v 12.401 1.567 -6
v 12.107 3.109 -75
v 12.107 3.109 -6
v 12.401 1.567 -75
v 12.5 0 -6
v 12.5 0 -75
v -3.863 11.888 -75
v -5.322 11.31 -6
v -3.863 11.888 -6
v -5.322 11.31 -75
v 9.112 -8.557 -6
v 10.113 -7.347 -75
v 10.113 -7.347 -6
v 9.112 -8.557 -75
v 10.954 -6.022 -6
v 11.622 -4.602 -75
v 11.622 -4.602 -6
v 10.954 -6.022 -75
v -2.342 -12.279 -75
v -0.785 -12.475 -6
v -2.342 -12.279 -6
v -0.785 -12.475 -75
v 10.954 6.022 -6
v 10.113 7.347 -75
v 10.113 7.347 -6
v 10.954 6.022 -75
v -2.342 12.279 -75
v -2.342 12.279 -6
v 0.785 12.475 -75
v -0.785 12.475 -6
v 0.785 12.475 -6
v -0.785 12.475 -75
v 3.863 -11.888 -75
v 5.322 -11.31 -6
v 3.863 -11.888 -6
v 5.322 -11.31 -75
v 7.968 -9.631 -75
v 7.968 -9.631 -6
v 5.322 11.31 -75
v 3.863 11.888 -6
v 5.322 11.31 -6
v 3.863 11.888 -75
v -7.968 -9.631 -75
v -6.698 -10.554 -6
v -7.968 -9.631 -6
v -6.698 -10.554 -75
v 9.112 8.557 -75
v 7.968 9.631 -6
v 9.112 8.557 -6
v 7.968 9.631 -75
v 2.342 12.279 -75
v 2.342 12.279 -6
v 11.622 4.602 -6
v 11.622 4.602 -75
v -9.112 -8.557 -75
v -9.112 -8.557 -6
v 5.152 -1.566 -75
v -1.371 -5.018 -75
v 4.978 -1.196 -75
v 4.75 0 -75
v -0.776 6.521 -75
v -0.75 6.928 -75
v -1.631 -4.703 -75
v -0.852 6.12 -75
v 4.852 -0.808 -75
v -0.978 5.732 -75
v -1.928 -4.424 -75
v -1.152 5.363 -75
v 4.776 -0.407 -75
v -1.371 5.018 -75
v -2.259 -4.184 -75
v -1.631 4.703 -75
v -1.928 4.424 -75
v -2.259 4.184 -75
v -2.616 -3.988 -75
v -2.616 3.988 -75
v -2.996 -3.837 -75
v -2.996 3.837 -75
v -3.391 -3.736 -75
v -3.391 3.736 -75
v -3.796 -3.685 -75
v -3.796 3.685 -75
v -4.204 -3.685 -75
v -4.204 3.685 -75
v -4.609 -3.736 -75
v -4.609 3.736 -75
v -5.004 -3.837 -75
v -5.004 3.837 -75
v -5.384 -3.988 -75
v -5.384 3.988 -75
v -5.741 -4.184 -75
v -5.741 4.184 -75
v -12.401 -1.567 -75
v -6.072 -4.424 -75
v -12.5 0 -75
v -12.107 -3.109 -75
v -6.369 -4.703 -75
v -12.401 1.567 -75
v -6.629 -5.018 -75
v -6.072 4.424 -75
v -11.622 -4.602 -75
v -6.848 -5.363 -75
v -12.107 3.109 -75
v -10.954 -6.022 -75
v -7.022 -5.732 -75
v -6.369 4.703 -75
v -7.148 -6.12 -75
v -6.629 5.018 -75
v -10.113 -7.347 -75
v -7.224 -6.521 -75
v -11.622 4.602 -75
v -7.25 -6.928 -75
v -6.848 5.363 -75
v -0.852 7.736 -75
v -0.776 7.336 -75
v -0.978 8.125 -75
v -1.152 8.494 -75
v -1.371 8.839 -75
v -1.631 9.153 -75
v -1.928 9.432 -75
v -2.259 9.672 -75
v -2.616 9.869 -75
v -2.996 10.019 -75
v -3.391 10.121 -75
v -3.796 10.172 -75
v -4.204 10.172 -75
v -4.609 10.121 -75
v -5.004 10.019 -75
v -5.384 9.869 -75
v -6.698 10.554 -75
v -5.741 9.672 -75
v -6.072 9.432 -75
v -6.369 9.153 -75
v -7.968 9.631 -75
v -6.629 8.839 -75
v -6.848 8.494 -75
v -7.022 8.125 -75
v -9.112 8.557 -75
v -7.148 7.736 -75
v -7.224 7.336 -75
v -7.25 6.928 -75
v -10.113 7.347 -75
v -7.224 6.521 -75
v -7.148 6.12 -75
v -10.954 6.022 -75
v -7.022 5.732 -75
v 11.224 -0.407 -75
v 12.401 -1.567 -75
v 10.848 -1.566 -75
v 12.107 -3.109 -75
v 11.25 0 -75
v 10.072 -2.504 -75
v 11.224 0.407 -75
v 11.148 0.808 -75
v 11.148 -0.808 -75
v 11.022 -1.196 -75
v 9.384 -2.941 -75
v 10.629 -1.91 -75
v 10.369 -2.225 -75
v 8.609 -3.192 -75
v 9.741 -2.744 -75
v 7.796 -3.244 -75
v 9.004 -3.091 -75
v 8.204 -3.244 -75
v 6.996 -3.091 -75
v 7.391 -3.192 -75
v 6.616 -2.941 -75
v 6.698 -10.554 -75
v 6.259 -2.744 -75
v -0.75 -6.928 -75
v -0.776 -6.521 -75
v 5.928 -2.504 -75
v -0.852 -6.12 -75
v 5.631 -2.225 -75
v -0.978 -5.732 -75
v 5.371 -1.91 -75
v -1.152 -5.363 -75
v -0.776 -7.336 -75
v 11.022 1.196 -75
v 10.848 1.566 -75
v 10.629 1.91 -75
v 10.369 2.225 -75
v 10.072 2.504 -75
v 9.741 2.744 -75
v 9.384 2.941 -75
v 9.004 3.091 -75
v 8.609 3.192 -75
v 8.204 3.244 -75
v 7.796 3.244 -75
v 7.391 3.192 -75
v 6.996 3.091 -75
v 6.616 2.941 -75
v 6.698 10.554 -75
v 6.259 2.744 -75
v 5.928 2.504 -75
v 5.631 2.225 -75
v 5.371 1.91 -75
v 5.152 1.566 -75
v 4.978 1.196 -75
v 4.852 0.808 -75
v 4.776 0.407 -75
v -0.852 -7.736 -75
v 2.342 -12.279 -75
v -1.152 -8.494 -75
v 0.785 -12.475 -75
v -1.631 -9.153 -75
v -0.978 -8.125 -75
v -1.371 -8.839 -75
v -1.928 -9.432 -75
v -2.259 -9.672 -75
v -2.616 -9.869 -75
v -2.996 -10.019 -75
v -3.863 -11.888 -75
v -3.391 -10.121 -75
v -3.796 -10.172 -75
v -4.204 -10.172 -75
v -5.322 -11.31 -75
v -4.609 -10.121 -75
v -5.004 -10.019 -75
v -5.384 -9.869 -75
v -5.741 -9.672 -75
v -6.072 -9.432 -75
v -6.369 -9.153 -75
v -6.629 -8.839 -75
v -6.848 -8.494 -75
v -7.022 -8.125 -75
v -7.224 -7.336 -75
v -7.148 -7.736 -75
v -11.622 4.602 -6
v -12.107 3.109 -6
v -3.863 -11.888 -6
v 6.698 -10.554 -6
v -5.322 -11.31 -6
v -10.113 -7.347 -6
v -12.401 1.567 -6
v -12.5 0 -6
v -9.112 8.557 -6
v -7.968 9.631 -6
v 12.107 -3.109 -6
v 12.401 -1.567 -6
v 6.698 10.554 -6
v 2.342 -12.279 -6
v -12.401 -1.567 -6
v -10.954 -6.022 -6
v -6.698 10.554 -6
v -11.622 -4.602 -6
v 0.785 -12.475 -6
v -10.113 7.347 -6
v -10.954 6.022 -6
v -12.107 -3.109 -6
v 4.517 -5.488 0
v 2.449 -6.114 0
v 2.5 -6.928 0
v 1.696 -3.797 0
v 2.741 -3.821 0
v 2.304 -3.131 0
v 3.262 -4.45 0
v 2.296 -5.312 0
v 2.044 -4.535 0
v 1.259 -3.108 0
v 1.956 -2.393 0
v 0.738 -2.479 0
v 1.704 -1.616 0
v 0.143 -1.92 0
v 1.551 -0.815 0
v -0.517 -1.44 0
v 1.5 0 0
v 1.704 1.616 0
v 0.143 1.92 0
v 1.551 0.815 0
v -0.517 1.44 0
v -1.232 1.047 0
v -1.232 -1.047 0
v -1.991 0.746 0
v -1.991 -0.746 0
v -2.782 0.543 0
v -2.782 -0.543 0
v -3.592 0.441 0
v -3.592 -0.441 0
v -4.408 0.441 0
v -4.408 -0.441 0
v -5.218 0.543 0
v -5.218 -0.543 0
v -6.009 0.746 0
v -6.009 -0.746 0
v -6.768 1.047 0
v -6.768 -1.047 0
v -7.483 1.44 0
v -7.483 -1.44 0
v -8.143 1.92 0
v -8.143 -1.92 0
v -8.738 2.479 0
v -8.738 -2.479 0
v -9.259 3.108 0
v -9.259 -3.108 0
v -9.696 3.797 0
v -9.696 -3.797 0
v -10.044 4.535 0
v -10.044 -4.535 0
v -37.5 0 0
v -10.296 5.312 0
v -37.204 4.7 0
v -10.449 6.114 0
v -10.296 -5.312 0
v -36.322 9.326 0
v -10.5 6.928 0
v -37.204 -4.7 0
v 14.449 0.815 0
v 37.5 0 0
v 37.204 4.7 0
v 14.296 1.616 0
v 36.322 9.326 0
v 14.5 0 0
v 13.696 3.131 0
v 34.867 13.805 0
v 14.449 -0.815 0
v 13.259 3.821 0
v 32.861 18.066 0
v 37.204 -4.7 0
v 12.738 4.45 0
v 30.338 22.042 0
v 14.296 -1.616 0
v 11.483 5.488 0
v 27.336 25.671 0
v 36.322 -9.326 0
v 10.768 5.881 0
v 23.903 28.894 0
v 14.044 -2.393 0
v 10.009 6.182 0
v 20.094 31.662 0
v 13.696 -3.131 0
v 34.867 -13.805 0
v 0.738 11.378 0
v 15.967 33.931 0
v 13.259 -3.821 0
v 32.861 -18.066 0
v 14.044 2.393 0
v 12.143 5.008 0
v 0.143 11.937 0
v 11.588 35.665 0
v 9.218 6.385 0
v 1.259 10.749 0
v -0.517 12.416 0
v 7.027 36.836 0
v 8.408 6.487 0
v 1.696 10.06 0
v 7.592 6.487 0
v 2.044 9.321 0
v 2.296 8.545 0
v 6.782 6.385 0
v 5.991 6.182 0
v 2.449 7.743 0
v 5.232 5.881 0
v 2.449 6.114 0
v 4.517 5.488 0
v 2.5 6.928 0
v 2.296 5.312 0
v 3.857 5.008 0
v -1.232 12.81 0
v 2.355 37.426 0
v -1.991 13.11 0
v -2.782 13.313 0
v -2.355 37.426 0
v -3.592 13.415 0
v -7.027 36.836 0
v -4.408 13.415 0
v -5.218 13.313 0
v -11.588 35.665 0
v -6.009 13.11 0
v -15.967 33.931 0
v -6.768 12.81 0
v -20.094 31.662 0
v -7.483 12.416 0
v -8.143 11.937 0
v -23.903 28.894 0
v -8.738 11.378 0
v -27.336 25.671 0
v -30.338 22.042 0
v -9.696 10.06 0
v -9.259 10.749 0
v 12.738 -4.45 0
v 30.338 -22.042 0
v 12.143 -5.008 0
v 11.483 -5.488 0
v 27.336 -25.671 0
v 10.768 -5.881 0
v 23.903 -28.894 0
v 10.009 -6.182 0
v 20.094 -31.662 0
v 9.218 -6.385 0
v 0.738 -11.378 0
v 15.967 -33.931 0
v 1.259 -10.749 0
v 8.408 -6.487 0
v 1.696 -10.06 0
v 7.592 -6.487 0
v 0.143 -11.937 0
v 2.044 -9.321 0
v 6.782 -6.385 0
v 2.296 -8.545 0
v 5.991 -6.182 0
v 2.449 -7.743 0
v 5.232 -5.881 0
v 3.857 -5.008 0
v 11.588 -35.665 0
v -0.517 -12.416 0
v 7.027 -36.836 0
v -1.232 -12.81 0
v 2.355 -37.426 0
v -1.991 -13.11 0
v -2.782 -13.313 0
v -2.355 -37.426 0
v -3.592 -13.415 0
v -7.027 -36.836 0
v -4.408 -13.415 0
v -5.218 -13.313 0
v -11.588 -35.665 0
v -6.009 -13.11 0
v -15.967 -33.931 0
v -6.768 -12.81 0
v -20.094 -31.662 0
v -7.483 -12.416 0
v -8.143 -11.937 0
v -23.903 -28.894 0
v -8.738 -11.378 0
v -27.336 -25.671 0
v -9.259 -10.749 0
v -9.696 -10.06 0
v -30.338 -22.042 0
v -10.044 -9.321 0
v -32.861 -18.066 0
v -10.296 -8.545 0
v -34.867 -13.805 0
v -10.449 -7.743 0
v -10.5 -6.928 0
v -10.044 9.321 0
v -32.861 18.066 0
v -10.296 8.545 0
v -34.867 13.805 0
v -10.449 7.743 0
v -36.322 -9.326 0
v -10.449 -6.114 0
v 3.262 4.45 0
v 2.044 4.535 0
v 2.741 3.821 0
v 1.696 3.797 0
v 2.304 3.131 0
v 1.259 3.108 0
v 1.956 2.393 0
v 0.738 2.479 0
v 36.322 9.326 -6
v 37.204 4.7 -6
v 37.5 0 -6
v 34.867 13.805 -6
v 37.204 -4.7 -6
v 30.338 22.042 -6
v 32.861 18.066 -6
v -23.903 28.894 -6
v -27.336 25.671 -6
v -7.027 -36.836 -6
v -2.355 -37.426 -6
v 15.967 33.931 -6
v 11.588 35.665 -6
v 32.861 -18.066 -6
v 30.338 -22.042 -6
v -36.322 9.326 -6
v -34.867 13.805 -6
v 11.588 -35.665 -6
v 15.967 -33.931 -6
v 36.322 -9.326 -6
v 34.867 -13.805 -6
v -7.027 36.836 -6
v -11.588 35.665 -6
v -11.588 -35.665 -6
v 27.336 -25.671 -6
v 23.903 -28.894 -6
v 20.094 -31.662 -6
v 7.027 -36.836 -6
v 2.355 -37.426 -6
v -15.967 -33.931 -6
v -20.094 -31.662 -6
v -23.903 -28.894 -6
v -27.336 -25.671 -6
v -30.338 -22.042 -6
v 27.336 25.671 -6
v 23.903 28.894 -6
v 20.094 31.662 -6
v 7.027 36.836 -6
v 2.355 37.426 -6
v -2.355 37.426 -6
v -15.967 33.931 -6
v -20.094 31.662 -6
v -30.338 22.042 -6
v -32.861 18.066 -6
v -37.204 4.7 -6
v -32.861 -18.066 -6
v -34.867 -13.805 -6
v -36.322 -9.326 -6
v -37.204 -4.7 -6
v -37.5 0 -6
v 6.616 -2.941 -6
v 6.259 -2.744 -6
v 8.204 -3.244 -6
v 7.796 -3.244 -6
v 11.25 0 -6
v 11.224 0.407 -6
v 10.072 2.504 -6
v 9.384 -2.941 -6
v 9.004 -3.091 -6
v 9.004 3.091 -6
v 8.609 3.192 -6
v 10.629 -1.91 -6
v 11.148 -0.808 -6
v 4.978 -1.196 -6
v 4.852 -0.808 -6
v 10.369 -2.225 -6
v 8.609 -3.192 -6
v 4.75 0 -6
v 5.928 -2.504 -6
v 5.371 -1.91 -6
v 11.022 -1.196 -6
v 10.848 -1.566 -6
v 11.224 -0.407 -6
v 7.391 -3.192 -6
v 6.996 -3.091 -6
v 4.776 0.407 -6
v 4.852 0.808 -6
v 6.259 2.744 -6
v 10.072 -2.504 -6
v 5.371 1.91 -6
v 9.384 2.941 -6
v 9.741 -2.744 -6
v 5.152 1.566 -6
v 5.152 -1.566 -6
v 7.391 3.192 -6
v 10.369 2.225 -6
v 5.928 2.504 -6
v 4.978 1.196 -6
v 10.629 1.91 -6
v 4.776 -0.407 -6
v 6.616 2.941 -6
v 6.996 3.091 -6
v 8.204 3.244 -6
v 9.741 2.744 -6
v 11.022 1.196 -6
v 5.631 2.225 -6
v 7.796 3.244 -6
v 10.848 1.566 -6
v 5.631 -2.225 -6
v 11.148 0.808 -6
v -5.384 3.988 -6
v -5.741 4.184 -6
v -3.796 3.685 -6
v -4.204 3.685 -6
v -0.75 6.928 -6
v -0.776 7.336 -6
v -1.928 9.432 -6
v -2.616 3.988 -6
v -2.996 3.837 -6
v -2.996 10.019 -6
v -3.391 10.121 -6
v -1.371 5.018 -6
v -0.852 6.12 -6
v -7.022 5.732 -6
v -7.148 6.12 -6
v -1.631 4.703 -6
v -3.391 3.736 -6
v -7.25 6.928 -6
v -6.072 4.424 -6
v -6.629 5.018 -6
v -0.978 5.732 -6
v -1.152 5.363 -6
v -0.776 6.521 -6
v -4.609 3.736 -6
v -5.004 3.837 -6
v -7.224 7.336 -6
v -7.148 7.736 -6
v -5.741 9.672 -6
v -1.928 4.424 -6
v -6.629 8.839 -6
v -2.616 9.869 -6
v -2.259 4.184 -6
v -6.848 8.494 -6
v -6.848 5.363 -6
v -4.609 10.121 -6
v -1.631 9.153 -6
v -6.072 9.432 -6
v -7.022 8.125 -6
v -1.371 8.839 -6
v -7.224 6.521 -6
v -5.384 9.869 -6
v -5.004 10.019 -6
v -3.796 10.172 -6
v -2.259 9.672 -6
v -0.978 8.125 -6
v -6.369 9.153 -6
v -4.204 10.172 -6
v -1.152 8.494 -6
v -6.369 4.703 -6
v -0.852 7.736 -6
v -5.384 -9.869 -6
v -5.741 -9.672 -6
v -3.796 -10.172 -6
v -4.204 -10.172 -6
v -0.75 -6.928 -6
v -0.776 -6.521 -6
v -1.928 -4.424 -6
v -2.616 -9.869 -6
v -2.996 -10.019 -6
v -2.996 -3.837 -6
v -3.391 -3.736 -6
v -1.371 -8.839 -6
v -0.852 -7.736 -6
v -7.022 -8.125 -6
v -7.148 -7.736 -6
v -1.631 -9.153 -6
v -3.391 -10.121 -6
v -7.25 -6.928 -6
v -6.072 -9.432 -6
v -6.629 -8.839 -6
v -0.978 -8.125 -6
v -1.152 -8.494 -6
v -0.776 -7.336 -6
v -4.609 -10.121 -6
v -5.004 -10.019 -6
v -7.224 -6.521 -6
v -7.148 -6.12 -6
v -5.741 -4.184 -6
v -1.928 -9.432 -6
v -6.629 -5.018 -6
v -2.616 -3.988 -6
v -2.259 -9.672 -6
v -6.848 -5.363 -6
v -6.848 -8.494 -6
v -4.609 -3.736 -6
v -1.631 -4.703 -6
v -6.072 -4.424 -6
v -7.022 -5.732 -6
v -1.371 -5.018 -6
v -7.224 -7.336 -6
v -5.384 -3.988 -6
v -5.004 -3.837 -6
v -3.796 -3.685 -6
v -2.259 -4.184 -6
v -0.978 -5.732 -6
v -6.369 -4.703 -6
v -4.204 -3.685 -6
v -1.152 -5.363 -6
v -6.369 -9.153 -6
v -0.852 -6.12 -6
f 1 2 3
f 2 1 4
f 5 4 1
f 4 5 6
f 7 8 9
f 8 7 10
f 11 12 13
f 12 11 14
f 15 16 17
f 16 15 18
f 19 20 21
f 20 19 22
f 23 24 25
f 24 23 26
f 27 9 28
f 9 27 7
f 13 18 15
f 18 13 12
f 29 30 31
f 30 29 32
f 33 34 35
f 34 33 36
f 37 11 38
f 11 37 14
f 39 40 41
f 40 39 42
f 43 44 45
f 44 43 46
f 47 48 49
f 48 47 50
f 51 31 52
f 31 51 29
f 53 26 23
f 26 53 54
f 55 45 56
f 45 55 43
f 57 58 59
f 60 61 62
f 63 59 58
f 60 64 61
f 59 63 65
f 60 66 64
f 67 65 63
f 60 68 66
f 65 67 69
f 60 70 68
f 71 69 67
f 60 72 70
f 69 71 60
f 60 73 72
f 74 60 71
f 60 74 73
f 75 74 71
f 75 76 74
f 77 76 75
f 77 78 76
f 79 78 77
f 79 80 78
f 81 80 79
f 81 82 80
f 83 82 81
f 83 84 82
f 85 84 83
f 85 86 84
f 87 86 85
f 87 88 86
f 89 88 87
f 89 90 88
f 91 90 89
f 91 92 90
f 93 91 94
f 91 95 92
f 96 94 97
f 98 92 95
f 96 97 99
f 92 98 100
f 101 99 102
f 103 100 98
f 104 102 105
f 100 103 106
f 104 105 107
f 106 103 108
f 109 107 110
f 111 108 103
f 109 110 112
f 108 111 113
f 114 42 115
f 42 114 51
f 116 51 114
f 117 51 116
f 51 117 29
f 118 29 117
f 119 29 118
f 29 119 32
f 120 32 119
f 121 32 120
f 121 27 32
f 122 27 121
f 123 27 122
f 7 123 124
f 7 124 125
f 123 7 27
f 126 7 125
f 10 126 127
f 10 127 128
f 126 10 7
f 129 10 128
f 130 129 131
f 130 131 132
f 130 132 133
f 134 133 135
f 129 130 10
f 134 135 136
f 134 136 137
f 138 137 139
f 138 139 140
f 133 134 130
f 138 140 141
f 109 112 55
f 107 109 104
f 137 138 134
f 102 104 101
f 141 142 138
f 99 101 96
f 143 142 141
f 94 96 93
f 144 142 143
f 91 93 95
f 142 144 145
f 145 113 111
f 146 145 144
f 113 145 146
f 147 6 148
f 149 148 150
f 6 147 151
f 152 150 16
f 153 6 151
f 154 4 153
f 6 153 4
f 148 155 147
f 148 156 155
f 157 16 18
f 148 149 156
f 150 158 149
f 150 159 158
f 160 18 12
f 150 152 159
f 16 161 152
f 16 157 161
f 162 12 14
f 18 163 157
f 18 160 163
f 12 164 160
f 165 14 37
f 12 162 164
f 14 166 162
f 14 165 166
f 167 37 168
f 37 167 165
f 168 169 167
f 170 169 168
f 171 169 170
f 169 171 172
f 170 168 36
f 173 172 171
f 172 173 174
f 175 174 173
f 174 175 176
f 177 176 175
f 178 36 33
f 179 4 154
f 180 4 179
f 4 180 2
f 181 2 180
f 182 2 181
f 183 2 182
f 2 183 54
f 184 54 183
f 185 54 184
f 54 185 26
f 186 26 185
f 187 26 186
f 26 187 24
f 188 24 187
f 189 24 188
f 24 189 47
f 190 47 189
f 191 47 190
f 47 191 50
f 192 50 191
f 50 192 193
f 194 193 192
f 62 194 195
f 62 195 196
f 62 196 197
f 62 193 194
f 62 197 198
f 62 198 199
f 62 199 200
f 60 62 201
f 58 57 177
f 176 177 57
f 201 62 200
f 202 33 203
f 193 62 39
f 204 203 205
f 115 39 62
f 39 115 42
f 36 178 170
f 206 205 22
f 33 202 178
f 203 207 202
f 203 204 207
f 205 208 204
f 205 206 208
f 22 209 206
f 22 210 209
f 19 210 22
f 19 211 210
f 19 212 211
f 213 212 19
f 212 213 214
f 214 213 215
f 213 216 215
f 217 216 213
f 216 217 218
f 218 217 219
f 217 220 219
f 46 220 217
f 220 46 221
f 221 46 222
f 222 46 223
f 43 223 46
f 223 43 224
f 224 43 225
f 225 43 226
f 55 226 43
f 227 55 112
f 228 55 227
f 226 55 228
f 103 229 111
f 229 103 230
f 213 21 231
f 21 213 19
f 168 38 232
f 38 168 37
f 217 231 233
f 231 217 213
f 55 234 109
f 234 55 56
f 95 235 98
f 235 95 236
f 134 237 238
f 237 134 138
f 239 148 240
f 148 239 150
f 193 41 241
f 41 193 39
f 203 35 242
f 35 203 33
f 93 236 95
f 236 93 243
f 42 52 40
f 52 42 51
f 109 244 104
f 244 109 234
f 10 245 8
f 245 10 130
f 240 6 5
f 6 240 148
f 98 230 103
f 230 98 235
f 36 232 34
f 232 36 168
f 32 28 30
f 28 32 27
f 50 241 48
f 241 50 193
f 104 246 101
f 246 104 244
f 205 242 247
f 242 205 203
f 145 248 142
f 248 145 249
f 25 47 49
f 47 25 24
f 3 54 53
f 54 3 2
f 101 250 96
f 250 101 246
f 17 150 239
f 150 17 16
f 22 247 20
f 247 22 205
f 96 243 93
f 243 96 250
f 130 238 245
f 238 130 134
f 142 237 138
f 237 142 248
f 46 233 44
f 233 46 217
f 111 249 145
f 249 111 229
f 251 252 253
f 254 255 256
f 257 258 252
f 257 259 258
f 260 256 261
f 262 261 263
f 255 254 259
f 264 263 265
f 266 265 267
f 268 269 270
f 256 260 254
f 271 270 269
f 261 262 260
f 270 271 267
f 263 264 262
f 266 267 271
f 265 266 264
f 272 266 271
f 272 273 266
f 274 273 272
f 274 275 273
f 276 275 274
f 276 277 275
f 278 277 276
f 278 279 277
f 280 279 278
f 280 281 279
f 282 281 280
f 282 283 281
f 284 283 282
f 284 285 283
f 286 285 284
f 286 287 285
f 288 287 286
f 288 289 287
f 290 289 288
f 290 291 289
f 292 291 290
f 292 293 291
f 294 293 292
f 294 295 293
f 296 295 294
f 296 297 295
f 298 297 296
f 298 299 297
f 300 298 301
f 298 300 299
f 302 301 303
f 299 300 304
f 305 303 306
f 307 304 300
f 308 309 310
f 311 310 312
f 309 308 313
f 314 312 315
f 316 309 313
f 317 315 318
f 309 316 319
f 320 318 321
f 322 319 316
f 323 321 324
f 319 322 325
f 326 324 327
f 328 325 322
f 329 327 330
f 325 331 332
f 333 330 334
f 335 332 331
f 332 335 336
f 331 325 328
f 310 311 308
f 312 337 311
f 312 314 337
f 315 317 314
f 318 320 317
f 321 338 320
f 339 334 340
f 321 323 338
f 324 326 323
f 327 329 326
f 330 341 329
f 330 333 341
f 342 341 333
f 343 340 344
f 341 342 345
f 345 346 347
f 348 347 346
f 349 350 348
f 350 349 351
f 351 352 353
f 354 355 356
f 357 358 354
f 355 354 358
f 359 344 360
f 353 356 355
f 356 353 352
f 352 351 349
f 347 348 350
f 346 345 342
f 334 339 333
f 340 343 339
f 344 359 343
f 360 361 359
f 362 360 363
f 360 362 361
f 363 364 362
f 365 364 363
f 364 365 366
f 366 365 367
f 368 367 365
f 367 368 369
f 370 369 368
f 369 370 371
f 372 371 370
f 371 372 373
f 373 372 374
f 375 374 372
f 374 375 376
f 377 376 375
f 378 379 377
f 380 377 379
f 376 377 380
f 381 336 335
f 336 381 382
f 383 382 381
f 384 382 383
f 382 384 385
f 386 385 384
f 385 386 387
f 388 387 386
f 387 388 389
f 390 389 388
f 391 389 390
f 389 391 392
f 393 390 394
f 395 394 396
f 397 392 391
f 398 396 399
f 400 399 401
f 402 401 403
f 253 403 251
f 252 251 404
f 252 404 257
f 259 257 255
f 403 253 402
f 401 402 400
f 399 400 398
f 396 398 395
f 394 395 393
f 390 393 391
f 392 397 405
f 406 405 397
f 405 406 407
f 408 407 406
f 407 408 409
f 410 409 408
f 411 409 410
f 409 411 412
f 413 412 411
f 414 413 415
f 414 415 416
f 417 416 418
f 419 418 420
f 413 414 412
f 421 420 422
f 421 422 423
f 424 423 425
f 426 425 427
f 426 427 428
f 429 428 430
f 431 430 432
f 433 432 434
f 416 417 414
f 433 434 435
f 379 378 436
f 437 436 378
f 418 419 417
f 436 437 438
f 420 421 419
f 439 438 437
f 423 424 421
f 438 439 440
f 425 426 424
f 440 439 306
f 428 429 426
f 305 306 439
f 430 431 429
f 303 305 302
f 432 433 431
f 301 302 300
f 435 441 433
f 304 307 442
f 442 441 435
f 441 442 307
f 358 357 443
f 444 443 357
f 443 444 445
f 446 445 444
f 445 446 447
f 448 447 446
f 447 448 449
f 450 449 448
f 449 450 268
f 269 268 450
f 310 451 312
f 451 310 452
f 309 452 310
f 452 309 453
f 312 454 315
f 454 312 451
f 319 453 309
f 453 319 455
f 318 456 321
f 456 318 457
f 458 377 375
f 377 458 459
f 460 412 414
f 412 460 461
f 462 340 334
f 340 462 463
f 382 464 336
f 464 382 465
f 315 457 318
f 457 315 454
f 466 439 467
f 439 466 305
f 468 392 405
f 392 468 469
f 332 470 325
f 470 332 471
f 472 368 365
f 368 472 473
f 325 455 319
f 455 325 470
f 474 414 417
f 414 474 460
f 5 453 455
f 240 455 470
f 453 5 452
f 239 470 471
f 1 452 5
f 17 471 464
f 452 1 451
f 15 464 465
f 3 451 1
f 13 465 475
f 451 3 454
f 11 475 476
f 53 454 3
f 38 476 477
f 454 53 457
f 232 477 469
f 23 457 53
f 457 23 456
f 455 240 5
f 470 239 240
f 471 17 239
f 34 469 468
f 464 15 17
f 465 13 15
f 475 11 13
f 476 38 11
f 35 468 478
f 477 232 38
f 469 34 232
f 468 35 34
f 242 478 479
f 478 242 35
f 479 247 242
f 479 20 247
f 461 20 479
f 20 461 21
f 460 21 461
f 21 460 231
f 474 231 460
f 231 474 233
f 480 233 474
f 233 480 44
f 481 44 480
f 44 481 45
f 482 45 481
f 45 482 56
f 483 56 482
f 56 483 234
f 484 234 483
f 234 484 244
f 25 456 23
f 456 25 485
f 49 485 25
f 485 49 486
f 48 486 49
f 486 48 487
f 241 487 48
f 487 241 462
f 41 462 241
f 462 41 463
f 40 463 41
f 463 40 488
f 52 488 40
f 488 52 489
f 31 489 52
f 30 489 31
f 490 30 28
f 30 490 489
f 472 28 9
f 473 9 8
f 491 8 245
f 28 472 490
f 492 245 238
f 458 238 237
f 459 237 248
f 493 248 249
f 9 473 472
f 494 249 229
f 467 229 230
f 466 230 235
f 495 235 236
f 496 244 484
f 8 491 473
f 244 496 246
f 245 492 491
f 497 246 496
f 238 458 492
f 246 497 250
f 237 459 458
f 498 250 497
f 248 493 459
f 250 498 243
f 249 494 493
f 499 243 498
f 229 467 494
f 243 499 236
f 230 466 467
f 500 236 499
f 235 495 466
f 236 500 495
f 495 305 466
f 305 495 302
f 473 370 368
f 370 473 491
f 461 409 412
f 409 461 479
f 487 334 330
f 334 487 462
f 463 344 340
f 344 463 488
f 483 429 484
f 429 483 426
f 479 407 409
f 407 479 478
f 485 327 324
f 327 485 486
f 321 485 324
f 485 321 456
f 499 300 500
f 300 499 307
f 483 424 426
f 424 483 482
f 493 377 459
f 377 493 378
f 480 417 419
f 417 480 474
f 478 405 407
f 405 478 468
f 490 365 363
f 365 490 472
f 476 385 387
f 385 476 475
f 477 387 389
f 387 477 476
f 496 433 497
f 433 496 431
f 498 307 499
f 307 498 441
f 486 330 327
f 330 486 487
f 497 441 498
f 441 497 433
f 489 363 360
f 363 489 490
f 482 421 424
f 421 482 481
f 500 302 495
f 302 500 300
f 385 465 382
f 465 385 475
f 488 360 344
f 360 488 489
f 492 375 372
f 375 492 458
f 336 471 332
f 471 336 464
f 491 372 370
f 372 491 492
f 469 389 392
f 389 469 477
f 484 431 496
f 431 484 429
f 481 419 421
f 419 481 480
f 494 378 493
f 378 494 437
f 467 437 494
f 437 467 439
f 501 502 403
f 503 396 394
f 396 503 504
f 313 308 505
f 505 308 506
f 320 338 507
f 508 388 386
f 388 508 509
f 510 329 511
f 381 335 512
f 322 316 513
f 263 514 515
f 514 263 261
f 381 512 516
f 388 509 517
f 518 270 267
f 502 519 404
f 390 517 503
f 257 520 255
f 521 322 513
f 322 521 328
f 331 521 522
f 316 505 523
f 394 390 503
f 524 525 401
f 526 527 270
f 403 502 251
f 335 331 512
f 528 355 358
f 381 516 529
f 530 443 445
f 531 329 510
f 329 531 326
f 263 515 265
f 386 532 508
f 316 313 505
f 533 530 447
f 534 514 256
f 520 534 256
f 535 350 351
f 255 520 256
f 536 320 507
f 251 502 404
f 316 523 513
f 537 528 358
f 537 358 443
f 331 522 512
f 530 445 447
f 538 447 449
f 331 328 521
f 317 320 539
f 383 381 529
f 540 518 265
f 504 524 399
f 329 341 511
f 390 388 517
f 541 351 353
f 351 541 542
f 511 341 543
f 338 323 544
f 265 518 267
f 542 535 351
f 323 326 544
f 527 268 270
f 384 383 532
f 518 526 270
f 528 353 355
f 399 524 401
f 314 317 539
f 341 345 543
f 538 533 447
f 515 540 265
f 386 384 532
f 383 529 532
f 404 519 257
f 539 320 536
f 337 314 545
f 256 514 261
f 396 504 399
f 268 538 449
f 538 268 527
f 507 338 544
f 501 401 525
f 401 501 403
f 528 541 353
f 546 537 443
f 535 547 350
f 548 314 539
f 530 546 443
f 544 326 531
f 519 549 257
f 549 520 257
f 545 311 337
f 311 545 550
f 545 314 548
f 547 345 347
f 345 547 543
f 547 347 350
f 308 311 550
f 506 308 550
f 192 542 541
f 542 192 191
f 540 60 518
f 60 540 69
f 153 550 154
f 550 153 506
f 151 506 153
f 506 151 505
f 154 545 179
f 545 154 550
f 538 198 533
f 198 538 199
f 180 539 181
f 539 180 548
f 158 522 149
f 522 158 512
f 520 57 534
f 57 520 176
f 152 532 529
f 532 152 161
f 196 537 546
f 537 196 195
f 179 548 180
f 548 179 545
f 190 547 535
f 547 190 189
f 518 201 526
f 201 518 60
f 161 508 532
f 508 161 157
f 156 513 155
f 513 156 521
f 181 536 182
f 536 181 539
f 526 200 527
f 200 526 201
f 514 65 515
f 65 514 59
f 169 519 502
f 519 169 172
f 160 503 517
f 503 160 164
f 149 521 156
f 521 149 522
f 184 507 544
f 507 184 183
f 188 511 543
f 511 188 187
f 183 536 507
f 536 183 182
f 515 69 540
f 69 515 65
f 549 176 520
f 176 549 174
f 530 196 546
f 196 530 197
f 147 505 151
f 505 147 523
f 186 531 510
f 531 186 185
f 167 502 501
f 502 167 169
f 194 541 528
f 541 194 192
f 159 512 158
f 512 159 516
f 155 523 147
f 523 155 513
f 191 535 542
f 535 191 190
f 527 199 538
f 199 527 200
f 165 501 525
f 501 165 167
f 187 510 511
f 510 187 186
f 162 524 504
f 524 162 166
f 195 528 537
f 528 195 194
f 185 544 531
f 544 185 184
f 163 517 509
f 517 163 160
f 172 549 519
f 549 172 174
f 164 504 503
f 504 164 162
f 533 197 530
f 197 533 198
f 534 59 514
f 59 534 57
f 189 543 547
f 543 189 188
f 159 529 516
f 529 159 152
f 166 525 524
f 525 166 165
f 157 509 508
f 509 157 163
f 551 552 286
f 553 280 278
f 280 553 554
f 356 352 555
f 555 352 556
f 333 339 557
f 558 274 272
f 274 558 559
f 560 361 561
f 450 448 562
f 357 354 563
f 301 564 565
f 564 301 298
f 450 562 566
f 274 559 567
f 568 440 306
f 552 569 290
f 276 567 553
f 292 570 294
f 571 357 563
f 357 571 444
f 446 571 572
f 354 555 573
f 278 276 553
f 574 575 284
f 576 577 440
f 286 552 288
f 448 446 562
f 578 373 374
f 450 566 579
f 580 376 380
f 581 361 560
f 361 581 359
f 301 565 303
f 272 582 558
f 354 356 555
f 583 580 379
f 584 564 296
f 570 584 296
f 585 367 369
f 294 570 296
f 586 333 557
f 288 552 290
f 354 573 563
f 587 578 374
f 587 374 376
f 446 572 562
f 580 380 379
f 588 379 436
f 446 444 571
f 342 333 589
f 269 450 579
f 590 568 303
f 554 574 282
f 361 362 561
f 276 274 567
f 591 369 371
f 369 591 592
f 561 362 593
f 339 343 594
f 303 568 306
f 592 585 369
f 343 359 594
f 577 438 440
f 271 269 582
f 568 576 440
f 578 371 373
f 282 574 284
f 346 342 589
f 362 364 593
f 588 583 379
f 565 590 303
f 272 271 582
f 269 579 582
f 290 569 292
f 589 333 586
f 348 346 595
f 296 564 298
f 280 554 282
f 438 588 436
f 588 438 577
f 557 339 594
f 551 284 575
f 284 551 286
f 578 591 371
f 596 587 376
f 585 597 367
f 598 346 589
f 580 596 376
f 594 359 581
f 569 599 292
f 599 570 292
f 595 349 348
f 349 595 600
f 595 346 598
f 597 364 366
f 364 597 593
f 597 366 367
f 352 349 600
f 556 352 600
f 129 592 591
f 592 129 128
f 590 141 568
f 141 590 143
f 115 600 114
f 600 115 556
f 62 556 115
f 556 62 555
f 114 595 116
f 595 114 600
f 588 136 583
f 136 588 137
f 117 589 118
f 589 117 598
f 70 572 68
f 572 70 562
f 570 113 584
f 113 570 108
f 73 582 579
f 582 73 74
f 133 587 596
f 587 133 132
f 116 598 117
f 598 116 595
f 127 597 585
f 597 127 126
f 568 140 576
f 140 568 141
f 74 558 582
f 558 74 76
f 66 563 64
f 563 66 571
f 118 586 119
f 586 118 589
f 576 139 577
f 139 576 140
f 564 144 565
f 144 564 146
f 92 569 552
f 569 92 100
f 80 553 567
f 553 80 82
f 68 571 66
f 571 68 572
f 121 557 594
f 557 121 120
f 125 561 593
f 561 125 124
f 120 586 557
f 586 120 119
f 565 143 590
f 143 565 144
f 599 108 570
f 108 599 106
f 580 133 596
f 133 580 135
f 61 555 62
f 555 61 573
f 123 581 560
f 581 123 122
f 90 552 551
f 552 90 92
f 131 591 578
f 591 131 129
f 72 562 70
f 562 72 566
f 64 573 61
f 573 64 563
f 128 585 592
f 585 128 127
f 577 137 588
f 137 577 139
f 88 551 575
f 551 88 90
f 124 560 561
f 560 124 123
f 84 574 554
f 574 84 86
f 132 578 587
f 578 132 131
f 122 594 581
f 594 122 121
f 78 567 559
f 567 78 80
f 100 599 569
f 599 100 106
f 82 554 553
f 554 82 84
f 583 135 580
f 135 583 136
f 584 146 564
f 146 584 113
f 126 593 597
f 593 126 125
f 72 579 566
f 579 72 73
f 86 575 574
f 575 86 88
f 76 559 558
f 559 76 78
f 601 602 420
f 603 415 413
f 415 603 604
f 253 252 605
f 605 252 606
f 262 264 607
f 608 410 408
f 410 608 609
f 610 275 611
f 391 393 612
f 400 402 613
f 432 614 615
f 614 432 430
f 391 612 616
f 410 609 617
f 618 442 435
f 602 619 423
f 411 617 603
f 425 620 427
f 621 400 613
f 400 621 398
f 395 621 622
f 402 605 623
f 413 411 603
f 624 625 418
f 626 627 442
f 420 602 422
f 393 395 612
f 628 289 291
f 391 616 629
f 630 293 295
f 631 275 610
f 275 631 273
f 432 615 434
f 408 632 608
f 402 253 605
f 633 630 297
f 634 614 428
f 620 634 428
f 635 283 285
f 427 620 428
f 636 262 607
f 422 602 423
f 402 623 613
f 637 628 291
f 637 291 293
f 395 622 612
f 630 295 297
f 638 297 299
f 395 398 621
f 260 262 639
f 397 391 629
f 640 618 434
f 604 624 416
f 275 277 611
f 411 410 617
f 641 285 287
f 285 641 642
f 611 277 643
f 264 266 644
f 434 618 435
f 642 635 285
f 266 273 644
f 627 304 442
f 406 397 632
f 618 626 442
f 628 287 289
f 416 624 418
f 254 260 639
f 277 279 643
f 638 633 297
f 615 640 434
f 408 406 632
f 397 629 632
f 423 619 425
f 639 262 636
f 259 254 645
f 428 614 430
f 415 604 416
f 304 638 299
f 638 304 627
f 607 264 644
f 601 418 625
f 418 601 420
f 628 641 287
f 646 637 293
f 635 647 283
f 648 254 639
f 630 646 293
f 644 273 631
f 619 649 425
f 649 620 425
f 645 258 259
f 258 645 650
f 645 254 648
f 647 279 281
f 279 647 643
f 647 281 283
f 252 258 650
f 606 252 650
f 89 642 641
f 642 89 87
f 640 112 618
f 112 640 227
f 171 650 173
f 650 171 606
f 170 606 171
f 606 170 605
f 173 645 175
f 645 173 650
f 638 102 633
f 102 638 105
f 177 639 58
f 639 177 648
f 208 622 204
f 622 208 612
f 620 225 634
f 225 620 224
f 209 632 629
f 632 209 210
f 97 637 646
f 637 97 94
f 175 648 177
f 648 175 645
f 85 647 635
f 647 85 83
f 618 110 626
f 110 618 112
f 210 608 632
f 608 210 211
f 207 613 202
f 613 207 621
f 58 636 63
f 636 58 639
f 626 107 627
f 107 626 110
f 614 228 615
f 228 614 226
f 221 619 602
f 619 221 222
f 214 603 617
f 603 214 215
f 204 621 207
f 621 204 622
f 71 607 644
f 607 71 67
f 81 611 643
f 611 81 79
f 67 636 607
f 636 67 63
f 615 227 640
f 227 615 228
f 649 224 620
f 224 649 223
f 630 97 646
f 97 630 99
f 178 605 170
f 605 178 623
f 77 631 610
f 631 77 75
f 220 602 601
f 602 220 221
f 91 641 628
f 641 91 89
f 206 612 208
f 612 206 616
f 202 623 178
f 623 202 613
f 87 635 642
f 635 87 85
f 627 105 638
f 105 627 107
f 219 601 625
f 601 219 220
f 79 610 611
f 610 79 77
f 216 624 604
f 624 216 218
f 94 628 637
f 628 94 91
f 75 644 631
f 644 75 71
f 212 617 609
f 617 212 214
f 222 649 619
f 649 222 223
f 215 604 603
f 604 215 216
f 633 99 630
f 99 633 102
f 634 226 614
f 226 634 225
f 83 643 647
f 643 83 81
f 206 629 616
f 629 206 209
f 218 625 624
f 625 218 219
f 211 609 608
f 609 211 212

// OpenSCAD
$fn = 50;


difference() {
	union() {
		translate(v = [0, 0, -75.0000000000]) {
			cylinder(h = 75, r = 12.5000000000);
		}
		translate(v = [0, 0, -6.0000000000]) {
			cylinder(h = 6, r = 37.5000000000);
		}
	}
	union() {
		translate(v = [8.0000000000, 0.0000000000, 0]) {
			rotate(a = [0, 0, 0]) {
				difference() {
					union() {
						#translate(v = [0, 0, -75.0000000000]) {
							cylinder(h = 75, r = 2.2500000000);
						}
						#translate(v = [0, 0, -6]) {
							cylinder(h = 6, r = 12.5000000000, r1 = 3.2500000000, r2 = 6.5000000000);
						}
						#translate(v = [0, 0, -75.0000000000]) {
							cylinder(h = 75, r = 3.2500000000);
						}
						#translate(v = [0, 0, -75.0000000000]) {
							cylinder(h = 75, r = 2.2500000000);
						}
					}
					union();
				}
			}
		}
		translate(v = [-4.0000000000, 6.9282032303, 0]) {
			rotate(a = [0, 0, 0]) {
				difference() {
					union() {
						#translate(v = [0, 0, -75.0000000000]) {
							cylinder(h = 75, r = 2.2500000000);
						}
						#translate(v = [0, 0, -6]) {
							cylinder(h = 6, r = 12.5000000000, r1 = 3.2500000000, r2 = 6.5000000000);
						}
						#translate(v = [0, 0, -75.0000000000]) {
							cylinder(h = 75, r = 3.2500000000);
						}
						#translate(v = [0, 0, -75.0000000000]) {
							cylinder(h = 75, r = 2.2500000000);
						}
					}
					union();
				}
			}
		}
		translate(v = [-4.0000000000, -6.9282032303, 0]) {
			rotate(a = [0, 0, 0]) {
				difference() {
					union() {
						#translate(v = [0, 0, -75.0000000000]) {
							cylinder(h = 75, r = 2.2500000000);
						}
						#translate(v = [0, 0, -6]) {
							cylinder(h = 6, r = 12.5000000000, r1 = 3.2500000000, r2 = 6.5000000000);
						}
						#translate(v = [0, 0, -75.0000000000]) {
							cylinder(h = 75, r = 3.2500000000);
						}
						#translate(v = [0, 0, -75.0000000000]) {
							cylinder(h = 75, r = 2.2500000000);
						}
					}
					union();
				}
			}
		}
	}
}
